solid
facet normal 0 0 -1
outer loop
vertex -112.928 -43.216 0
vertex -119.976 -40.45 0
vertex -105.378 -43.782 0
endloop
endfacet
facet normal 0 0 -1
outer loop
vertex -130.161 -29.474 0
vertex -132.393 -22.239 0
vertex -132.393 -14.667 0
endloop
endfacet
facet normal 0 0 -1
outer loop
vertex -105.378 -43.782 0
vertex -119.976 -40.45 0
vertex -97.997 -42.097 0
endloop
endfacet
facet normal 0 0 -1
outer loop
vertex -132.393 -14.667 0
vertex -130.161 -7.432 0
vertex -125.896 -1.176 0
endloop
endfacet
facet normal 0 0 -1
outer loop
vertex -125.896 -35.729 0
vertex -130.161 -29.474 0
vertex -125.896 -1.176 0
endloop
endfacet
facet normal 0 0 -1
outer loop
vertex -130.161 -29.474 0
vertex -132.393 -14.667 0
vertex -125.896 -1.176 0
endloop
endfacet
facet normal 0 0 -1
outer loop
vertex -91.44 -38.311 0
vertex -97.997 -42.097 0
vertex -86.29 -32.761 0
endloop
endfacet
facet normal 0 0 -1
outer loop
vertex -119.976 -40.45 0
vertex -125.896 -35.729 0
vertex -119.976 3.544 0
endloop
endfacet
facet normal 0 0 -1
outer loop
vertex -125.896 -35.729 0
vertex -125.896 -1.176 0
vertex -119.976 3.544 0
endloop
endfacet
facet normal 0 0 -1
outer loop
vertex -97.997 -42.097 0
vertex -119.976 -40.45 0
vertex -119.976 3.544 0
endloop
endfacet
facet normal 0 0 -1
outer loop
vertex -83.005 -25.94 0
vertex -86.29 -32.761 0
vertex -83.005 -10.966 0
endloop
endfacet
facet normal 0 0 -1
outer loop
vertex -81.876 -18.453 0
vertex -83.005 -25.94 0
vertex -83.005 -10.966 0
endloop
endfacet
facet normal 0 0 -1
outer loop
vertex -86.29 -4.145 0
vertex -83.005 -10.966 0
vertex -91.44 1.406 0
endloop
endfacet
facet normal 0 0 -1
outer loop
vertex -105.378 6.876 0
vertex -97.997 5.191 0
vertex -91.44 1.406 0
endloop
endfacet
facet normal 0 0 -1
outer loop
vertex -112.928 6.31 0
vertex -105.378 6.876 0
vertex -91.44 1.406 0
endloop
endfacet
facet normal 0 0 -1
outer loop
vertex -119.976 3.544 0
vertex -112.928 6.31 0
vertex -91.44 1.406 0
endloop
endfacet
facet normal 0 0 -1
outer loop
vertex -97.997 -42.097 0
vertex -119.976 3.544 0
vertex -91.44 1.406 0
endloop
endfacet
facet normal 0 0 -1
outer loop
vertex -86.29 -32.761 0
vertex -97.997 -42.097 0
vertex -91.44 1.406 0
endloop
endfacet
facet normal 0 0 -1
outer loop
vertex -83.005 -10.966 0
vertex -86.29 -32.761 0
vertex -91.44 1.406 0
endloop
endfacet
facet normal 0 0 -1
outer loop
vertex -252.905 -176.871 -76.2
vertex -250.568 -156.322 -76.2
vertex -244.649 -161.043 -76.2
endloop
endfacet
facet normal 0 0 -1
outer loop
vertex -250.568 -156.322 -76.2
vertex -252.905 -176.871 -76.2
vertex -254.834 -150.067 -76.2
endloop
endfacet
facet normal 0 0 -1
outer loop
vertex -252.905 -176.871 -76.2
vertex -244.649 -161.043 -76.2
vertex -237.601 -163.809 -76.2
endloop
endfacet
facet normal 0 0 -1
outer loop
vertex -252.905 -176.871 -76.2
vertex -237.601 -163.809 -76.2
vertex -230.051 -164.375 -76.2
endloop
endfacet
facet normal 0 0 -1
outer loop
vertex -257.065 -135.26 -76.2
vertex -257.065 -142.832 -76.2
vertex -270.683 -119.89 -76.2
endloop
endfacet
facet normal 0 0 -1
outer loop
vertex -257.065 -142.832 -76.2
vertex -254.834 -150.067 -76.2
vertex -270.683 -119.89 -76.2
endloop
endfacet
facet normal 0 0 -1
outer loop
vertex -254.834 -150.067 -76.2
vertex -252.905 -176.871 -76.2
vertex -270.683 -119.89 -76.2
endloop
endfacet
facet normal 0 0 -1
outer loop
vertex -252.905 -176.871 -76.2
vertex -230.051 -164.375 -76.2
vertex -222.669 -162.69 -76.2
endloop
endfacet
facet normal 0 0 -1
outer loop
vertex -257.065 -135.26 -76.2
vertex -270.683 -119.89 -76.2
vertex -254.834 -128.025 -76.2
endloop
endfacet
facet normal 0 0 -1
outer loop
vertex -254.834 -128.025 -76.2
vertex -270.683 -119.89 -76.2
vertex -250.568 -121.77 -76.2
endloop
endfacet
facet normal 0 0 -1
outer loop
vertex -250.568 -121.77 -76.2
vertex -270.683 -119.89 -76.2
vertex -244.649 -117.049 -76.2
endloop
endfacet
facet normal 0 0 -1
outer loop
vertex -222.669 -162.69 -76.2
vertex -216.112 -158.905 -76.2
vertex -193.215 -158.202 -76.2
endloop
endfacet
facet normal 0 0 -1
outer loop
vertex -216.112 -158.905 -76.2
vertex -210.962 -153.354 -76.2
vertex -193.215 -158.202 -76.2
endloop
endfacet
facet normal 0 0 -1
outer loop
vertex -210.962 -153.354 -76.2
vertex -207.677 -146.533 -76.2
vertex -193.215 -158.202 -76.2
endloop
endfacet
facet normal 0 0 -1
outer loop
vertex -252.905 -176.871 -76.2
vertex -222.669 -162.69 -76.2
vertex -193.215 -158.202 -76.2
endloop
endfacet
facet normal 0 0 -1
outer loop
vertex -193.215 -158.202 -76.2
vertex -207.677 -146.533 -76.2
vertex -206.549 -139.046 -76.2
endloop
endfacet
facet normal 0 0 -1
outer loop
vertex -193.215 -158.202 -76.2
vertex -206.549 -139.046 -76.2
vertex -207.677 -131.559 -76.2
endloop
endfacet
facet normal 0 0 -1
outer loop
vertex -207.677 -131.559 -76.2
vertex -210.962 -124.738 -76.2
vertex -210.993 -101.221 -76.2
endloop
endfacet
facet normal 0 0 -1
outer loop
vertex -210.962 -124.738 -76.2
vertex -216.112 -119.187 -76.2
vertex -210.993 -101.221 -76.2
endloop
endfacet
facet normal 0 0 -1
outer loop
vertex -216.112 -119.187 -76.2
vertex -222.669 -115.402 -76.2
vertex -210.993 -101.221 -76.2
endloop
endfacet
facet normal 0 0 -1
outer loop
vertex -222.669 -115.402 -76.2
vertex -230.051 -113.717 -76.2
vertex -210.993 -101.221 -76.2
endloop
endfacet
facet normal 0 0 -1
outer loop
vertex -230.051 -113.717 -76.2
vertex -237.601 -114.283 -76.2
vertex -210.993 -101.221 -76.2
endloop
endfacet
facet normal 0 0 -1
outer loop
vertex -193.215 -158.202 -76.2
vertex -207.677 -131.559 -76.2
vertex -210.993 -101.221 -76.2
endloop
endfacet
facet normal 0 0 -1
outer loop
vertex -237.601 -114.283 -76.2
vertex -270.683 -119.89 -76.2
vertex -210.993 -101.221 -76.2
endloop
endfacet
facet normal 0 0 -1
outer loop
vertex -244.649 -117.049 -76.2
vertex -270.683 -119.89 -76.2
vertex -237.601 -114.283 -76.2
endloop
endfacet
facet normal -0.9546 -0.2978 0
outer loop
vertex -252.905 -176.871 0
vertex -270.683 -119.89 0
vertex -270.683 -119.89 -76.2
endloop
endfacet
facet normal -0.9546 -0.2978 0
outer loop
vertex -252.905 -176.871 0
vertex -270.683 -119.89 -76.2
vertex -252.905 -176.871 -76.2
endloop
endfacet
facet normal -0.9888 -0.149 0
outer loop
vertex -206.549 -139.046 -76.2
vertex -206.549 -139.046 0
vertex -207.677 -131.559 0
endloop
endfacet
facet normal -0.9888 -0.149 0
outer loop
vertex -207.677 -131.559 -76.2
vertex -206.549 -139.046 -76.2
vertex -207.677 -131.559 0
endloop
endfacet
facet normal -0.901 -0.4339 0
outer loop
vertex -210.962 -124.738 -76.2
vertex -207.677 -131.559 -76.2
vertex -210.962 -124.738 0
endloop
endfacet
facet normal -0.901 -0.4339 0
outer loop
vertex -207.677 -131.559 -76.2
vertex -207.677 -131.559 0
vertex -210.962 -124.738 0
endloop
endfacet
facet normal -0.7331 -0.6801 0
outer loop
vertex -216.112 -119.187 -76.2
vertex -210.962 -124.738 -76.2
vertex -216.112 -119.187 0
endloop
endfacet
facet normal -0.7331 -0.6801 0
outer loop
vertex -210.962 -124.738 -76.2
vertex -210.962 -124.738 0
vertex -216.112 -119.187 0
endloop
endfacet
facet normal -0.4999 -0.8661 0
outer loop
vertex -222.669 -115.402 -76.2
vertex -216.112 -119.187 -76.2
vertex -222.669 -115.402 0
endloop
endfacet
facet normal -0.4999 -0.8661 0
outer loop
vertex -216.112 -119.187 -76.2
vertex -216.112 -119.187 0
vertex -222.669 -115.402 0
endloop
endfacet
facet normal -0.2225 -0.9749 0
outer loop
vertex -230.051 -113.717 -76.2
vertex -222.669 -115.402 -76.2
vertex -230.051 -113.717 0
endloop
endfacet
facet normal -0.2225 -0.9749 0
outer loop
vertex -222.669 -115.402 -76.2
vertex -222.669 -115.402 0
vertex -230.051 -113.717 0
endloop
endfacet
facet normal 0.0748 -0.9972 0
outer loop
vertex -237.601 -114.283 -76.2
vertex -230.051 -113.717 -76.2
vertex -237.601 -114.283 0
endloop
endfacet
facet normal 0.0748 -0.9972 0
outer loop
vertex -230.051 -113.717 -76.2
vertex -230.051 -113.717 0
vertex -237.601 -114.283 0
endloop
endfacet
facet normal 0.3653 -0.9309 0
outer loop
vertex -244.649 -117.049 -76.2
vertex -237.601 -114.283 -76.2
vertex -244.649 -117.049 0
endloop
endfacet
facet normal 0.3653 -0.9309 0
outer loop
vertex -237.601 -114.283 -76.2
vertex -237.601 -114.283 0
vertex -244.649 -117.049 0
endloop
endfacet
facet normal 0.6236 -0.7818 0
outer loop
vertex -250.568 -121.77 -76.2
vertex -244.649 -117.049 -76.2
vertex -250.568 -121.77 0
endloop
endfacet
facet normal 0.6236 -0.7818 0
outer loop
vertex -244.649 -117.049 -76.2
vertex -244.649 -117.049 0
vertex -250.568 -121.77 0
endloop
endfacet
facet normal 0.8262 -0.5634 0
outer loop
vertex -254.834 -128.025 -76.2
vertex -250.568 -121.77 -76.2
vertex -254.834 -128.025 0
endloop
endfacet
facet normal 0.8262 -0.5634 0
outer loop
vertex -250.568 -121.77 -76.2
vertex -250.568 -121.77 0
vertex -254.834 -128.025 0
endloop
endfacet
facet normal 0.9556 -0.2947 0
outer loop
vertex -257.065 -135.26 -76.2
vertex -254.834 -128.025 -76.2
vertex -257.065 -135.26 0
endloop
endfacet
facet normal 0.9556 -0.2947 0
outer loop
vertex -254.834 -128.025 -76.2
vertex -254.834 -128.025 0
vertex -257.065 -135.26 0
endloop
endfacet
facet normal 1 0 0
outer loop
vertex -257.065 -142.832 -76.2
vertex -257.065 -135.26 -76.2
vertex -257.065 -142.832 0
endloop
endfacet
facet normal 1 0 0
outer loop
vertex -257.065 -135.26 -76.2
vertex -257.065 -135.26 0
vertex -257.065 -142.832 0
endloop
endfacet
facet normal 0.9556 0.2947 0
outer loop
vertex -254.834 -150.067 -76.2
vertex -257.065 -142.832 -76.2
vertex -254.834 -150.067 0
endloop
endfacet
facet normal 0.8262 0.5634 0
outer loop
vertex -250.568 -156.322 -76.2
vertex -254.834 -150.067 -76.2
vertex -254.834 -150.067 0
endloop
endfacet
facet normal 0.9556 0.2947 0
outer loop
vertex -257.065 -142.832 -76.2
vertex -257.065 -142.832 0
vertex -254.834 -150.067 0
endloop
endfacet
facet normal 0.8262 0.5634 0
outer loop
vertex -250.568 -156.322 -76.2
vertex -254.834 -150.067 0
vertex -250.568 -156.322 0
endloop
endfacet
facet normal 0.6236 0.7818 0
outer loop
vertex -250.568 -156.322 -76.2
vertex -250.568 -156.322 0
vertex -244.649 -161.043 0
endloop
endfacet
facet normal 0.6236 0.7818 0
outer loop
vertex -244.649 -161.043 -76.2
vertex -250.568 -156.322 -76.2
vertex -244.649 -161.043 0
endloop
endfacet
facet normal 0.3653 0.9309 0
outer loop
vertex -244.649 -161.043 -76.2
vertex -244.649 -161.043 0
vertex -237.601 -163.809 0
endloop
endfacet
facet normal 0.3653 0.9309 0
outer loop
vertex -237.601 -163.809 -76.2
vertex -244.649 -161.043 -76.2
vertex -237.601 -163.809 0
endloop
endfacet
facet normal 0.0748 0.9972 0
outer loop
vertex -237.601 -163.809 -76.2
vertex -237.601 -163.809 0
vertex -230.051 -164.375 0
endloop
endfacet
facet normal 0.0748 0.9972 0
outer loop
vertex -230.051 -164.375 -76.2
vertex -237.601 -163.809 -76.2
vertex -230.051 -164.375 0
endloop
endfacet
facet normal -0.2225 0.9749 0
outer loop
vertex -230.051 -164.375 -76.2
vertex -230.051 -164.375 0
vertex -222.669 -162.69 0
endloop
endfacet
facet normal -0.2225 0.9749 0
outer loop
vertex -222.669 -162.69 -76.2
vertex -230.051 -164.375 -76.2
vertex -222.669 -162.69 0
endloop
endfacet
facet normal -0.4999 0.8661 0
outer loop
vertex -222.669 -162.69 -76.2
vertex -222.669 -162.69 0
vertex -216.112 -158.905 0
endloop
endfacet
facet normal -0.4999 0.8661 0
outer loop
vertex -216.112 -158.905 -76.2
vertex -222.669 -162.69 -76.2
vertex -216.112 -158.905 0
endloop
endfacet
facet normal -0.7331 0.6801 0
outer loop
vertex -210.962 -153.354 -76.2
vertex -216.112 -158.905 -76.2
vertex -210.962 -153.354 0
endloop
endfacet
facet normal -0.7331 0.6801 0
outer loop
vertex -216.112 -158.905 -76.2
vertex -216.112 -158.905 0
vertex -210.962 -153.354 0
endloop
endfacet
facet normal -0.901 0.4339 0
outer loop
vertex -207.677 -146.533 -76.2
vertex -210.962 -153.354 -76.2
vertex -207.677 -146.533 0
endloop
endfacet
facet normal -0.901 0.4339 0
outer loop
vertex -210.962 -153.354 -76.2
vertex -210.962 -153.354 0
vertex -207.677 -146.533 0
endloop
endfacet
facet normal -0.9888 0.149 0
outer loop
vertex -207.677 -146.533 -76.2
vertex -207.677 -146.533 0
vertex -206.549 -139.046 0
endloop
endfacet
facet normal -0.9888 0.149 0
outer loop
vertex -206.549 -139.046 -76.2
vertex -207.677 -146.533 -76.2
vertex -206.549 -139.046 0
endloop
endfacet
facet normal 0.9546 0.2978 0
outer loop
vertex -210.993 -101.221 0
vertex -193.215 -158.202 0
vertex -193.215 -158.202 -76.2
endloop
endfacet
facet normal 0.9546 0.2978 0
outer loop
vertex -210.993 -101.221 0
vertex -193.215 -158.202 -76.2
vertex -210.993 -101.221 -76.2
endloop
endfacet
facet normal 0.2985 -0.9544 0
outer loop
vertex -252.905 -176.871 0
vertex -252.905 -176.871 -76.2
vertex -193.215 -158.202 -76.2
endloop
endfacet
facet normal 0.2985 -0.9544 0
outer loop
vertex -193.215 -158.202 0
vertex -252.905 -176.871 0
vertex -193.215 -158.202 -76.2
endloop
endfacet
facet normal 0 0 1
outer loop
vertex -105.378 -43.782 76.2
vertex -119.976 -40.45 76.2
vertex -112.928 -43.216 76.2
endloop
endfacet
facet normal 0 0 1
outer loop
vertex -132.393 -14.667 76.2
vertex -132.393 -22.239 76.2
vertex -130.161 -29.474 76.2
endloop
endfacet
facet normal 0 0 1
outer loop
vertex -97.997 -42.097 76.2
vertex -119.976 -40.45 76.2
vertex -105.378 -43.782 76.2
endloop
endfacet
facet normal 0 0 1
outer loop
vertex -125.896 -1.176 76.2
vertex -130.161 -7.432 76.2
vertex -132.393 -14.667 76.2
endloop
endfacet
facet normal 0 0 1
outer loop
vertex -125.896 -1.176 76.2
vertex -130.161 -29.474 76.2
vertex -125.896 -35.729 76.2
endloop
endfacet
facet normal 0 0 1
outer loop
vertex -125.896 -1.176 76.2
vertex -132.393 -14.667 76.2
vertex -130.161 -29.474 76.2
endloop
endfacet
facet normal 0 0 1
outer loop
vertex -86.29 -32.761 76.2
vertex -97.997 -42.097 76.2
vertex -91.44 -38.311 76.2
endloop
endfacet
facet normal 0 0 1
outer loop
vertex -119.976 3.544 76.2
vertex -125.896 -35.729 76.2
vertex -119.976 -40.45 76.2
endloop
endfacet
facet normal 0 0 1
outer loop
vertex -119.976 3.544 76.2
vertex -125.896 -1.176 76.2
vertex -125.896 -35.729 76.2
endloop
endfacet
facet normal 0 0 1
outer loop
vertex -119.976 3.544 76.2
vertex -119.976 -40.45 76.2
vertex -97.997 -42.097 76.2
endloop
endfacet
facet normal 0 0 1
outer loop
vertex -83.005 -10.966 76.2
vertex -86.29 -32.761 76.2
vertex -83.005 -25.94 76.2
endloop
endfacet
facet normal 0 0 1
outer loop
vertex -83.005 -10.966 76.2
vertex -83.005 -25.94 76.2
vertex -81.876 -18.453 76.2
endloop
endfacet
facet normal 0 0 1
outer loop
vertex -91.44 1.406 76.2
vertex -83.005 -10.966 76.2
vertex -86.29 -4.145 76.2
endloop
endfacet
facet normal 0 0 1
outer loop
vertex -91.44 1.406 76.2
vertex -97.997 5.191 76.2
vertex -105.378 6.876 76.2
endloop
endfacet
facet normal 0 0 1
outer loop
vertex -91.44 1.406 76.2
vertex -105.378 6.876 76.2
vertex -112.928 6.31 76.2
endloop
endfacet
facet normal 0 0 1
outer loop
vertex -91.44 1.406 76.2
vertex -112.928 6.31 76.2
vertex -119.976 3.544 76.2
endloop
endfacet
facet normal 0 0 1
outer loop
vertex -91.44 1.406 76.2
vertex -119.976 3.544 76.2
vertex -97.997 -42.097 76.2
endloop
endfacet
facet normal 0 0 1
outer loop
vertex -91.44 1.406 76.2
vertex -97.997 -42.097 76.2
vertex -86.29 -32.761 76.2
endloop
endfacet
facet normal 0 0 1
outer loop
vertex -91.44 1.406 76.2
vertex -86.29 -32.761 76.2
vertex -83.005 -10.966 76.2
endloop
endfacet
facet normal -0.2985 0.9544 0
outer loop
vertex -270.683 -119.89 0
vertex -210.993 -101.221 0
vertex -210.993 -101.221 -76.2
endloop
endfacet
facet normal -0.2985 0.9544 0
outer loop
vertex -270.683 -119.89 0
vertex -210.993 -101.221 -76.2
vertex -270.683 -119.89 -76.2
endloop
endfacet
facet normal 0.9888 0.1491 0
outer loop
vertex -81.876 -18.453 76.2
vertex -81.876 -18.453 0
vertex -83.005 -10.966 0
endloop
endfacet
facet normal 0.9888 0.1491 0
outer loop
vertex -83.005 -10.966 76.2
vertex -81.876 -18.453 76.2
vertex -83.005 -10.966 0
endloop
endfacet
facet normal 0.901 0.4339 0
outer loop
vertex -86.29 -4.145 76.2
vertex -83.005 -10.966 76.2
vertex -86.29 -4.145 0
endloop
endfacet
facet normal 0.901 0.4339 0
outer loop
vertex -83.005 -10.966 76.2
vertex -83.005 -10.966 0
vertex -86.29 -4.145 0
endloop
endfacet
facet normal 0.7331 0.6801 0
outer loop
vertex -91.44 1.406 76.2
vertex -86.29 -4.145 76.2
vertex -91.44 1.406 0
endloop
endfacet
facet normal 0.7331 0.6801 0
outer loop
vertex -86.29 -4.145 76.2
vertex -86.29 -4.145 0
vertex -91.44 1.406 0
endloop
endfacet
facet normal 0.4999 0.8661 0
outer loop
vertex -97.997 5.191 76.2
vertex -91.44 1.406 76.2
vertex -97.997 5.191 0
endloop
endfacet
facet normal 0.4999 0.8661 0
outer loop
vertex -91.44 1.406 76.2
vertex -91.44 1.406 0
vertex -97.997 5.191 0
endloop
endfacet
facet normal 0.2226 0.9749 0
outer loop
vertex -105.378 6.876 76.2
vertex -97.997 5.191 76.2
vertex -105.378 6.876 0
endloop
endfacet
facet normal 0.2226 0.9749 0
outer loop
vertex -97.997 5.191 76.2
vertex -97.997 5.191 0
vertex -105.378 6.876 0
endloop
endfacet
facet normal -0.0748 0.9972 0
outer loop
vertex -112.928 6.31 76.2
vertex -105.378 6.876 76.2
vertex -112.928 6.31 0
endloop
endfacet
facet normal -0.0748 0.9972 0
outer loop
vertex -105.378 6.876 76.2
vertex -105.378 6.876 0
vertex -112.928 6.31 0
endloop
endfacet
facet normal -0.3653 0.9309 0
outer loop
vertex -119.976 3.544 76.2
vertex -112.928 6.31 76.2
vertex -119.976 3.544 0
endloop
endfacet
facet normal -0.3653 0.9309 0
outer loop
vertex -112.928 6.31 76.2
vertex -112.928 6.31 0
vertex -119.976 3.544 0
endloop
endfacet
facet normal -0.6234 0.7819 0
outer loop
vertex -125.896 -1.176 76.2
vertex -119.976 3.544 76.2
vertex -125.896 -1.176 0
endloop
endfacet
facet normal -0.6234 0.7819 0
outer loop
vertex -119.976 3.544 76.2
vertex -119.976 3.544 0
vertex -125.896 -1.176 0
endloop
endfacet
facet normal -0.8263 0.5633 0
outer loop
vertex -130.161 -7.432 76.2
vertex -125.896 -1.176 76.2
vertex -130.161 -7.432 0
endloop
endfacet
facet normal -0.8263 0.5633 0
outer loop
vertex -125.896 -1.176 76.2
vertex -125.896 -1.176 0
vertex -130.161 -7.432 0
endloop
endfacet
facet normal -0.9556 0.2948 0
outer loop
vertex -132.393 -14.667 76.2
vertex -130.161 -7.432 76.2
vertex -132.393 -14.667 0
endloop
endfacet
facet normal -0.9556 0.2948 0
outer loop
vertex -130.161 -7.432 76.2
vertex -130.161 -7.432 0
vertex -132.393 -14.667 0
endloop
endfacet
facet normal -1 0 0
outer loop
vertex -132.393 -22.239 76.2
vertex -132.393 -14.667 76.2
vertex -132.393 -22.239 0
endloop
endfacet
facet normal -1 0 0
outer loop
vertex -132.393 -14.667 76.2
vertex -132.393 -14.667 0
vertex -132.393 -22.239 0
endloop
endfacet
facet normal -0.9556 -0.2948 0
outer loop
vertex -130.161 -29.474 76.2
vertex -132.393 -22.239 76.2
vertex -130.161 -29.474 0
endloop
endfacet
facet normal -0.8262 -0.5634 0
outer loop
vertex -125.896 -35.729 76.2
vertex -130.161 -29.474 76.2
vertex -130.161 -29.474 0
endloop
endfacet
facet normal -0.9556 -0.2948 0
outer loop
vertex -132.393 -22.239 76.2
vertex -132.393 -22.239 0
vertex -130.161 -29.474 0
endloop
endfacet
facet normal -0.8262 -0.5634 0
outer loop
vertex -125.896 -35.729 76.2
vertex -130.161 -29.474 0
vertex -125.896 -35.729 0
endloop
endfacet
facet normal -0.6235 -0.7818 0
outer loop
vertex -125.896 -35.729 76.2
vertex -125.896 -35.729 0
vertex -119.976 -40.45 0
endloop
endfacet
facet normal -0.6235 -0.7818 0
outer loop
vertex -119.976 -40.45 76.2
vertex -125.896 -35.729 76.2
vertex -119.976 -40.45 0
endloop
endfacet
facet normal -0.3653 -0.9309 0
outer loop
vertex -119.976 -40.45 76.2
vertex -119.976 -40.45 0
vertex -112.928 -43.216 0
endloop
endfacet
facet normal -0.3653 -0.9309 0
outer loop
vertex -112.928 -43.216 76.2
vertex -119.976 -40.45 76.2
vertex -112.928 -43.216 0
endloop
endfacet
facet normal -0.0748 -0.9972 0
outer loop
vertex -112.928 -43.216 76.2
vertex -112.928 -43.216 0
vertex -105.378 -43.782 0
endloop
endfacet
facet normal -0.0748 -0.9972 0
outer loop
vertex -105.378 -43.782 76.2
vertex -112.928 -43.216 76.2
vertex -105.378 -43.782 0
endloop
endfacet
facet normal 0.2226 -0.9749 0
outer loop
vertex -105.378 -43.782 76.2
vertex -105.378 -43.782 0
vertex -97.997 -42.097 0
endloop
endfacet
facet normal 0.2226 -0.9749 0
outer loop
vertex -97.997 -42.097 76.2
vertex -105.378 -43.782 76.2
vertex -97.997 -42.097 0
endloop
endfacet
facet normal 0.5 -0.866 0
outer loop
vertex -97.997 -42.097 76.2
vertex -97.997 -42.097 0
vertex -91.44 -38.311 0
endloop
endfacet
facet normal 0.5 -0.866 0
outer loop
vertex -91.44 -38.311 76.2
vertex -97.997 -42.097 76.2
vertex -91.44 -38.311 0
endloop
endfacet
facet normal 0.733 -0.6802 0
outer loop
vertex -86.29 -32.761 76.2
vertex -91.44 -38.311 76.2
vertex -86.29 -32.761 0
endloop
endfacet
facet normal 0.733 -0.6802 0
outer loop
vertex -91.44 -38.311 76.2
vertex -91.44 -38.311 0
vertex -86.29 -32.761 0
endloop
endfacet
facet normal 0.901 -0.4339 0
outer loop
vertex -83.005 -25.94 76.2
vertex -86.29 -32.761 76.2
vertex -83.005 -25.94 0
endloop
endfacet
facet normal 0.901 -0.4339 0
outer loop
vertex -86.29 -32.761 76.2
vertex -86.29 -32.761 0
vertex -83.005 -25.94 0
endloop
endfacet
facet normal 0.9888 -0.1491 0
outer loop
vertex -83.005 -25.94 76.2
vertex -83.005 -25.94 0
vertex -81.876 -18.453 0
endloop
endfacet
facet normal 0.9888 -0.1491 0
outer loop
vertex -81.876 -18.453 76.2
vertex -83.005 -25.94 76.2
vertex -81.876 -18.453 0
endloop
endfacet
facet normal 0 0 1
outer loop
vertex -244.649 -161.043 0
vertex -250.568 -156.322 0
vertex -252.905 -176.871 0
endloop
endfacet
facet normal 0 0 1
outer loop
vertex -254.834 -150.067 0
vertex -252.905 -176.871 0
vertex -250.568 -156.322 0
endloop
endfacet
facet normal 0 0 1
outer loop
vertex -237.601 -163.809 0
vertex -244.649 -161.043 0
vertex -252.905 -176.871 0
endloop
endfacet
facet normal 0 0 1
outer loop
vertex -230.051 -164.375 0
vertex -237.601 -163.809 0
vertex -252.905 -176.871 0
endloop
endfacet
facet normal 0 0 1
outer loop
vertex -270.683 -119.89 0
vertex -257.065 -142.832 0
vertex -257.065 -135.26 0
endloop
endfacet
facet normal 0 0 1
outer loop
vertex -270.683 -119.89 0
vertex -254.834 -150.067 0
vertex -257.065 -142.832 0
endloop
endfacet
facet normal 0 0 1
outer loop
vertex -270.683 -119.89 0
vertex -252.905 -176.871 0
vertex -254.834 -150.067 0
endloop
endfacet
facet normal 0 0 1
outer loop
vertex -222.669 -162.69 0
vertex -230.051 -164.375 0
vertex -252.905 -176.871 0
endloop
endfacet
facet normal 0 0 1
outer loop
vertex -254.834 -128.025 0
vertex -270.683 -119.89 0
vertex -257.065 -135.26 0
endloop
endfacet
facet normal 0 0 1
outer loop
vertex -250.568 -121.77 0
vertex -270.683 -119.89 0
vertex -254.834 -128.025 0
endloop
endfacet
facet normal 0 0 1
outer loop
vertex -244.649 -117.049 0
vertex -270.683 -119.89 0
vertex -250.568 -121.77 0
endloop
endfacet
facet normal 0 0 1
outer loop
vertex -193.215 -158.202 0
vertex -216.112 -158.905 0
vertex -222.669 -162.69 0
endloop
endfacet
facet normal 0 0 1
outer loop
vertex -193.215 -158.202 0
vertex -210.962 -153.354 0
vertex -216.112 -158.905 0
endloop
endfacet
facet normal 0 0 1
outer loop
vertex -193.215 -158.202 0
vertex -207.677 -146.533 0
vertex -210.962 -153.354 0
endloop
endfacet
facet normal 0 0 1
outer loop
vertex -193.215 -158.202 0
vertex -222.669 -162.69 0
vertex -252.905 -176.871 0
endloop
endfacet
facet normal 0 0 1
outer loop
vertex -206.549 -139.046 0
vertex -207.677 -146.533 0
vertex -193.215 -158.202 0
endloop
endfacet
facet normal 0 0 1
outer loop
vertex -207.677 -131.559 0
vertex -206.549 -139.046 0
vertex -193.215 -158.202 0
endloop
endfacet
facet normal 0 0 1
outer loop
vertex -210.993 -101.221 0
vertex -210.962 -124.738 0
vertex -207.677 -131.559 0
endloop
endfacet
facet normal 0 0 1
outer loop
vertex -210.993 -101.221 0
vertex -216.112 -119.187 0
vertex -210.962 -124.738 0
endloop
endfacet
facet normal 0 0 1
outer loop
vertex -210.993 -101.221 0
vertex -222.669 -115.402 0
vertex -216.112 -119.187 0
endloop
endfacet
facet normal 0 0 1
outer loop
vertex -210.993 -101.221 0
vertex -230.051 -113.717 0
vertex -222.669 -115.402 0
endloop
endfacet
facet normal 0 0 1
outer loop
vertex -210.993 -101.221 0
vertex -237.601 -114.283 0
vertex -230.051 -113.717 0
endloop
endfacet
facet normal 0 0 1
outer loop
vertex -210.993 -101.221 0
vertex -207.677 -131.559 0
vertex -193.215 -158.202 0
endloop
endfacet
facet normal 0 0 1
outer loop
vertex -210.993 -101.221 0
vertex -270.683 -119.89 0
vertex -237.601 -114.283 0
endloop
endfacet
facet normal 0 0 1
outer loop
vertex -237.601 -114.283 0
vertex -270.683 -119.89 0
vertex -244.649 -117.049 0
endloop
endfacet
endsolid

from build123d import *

# Parameters (mm, degrees)
F0_R     = 25.4
F1_DEPTH = 76.2
F2_R     = 25.4
F3_DEPTH = 76.2


with BuildPart() as f1:
    # F0 (on Top) → F1 (new body)
    with BuildSketch(Plane.XY):
        with Locations((-107.276268, -18.452886)):
            Circle(F0_R)
    extrude(amount=F1_DEPTH)


with BuildPart() as f3:
    # F2 (on Top) → F3 (new body)
    with BuildSketch(Plane.XY):
        Polygon((-210.993154, -101.221448), (-270.683154, -119.889624), (-252.904745, -176.870535), (-193.214745, -158.202359), align=None)
        with Locations((-231.94895, -139.045991)):
            Circle(F2_R, mode=Mode.SUBTRACT)
    extrude(amount=-F3_DEPTH)


solid = Compound([f1.part, f3.part])
